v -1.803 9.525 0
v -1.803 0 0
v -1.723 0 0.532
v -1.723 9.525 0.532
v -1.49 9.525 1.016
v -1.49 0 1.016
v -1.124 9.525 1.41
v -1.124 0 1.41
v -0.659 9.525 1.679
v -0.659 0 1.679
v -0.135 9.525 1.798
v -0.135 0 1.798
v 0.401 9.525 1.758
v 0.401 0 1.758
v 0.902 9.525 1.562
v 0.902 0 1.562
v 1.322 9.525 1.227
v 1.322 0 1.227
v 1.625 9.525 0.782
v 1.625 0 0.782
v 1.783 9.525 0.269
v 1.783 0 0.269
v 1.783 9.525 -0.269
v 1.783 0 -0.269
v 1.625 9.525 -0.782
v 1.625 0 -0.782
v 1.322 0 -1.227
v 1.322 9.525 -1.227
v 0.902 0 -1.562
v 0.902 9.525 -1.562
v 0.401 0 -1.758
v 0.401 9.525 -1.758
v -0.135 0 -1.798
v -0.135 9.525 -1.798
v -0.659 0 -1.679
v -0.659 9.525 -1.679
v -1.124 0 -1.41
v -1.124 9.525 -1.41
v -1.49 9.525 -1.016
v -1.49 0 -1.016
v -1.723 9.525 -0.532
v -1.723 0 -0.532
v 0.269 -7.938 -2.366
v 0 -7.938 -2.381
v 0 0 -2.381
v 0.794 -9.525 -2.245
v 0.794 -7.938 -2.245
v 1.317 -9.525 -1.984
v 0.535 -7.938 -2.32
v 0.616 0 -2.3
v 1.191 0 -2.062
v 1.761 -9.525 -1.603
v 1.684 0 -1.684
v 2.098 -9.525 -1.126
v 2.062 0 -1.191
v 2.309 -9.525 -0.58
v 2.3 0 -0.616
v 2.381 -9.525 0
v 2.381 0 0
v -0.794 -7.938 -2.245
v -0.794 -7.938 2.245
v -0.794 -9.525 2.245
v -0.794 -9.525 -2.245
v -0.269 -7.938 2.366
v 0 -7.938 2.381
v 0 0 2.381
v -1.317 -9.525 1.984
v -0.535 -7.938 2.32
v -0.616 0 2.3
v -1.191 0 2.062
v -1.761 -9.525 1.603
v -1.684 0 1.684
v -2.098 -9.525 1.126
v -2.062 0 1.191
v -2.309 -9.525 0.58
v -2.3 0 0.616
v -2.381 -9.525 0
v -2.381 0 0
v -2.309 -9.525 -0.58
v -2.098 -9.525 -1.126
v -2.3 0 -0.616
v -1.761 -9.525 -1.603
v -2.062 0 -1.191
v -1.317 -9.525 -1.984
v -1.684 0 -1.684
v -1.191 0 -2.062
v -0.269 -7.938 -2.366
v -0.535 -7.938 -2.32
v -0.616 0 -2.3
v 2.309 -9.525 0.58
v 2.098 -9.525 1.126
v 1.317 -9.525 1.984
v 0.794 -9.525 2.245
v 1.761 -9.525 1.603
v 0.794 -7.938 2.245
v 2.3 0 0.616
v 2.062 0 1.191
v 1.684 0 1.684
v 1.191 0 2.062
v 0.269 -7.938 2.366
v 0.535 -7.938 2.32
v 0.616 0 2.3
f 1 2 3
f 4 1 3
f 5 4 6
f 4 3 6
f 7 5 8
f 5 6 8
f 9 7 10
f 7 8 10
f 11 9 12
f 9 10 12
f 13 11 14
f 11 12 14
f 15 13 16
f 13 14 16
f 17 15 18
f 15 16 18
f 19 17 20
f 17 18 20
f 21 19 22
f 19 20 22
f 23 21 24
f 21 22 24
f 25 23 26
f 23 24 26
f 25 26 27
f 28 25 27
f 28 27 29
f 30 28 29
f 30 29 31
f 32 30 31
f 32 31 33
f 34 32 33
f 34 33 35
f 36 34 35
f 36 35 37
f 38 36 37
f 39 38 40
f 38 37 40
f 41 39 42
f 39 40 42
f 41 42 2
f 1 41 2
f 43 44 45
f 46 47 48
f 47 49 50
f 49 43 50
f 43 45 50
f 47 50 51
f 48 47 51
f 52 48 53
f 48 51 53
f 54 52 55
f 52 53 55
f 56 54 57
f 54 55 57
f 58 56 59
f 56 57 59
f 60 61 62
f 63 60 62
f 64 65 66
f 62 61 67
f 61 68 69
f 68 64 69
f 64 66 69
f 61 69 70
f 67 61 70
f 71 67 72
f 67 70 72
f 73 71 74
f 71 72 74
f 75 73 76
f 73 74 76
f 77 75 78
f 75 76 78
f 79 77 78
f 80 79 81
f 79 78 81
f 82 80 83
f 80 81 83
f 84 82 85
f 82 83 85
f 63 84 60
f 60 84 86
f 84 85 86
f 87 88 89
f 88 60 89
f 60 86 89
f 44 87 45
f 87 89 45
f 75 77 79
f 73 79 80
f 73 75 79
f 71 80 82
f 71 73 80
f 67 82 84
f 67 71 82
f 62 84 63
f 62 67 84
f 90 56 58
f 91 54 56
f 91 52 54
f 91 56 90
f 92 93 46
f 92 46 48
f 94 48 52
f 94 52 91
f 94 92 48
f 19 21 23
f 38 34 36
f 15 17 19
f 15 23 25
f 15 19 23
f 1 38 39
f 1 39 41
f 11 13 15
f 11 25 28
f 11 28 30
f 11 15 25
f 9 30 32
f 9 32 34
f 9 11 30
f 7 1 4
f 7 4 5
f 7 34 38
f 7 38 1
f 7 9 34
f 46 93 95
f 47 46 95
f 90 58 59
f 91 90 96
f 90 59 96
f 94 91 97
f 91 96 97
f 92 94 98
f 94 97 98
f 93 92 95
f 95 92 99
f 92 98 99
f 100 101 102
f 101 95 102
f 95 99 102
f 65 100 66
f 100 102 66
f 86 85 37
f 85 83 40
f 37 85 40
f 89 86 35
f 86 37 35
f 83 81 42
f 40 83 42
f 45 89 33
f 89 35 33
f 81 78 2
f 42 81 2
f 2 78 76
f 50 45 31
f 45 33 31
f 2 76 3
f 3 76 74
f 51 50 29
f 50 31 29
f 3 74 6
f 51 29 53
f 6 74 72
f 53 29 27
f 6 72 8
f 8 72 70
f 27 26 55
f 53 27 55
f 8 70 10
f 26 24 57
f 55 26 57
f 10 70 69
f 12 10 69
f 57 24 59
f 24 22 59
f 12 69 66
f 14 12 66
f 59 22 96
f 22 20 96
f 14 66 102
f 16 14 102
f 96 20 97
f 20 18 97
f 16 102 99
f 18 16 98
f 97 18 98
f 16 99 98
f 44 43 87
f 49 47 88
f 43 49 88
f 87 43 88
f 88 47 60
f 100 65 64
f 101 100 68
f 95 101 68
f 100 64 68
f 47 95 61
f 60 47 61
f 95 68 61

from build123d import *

# Parameters (mm, degrees)
F0_W     = 4.7625
F0_H     = 4.7625
F1_DEPTH = 9.525
F3_DEPTH = 25.4
F5_DEPTH = 25.4
F6_R     = 1.8034
F7_DEPTH = 9.525


with BuildPart() as f1:
    # F0 (on Front) → F1 (new body)
    with BuildSketch(Plane.XZ):
        Rectangle(F0_W, F0_H)
    extrude(amount=F1_DEPTH)

    # F2 (on face) → F3 (cut)
    with BuildSketch(Plane.XY.offset(2.38125)):
        Polygon((-0.79375, -9.525), (0, -9.525), (0.79375, -9.525), (0.79375, -7.9375), (-0.79375, -7.9375), align=None)
    extrude(amount=-F3_DEPTH, mode=Mode.SUBTRACT)

    # F4 (on face) → F5 (cut)
    with BuildSketch(Plane(origin=(0, 0, 0), x_dir=(-1, 0, 0), z_dir=(0, 1, 0))):
        with BuildLine():
            ThreePointArc((-2.38125, 0), (-1.6837980227, 1.6837980227), (0, 2.38125))
            Line((0, 2.38125), (-2.38125, 2.38125))
            Line((-2.38125, 2.38125), (-2.38125, 0))
        make_face()
        with BuildLine():
            ThreePointArc((0, 2.38125), (1.6837980227, 1.6837980227), (2.38125, 0))
            Line((2.38125, 0), (2.38125, 2.38125))
            Line((2.38125, 2.38125), (0, 2.38125))
        make_face()
        with BuildLine():
            Line((2.38125, -2.38125), (2.38125, 0))
            ThreePointArc((2.38125, 0), (1.6837980227, -1.6837980227), (0, -2.38125))
            Line((0, -2.38125), (2.38125, -2.38125))
        make_face()
        with BuildLine():
            Line((-2.38125, -2.38125), (0, -2.38125))
            ThreePointArc((0, -2.38125), (-1.6837980227, -1.6837980227), (-2.38125, 0))
            Line((-2.38125, 0), (-2.38125, -2.38125))
        make_face()
    extrude(amount=-F5_DEPTH, mode=Mode.SUBTRACT)

    # F6 (on face) → F7 (join)
    with BuildSketch(Plane(origin=(0, 0, 0), x_dir=(-1, 0, 0), z_dir=(0, 1, 0))):
        Circle(F6_R)
    extrude(amount=F7_DEPTH)


solid = f1.part
